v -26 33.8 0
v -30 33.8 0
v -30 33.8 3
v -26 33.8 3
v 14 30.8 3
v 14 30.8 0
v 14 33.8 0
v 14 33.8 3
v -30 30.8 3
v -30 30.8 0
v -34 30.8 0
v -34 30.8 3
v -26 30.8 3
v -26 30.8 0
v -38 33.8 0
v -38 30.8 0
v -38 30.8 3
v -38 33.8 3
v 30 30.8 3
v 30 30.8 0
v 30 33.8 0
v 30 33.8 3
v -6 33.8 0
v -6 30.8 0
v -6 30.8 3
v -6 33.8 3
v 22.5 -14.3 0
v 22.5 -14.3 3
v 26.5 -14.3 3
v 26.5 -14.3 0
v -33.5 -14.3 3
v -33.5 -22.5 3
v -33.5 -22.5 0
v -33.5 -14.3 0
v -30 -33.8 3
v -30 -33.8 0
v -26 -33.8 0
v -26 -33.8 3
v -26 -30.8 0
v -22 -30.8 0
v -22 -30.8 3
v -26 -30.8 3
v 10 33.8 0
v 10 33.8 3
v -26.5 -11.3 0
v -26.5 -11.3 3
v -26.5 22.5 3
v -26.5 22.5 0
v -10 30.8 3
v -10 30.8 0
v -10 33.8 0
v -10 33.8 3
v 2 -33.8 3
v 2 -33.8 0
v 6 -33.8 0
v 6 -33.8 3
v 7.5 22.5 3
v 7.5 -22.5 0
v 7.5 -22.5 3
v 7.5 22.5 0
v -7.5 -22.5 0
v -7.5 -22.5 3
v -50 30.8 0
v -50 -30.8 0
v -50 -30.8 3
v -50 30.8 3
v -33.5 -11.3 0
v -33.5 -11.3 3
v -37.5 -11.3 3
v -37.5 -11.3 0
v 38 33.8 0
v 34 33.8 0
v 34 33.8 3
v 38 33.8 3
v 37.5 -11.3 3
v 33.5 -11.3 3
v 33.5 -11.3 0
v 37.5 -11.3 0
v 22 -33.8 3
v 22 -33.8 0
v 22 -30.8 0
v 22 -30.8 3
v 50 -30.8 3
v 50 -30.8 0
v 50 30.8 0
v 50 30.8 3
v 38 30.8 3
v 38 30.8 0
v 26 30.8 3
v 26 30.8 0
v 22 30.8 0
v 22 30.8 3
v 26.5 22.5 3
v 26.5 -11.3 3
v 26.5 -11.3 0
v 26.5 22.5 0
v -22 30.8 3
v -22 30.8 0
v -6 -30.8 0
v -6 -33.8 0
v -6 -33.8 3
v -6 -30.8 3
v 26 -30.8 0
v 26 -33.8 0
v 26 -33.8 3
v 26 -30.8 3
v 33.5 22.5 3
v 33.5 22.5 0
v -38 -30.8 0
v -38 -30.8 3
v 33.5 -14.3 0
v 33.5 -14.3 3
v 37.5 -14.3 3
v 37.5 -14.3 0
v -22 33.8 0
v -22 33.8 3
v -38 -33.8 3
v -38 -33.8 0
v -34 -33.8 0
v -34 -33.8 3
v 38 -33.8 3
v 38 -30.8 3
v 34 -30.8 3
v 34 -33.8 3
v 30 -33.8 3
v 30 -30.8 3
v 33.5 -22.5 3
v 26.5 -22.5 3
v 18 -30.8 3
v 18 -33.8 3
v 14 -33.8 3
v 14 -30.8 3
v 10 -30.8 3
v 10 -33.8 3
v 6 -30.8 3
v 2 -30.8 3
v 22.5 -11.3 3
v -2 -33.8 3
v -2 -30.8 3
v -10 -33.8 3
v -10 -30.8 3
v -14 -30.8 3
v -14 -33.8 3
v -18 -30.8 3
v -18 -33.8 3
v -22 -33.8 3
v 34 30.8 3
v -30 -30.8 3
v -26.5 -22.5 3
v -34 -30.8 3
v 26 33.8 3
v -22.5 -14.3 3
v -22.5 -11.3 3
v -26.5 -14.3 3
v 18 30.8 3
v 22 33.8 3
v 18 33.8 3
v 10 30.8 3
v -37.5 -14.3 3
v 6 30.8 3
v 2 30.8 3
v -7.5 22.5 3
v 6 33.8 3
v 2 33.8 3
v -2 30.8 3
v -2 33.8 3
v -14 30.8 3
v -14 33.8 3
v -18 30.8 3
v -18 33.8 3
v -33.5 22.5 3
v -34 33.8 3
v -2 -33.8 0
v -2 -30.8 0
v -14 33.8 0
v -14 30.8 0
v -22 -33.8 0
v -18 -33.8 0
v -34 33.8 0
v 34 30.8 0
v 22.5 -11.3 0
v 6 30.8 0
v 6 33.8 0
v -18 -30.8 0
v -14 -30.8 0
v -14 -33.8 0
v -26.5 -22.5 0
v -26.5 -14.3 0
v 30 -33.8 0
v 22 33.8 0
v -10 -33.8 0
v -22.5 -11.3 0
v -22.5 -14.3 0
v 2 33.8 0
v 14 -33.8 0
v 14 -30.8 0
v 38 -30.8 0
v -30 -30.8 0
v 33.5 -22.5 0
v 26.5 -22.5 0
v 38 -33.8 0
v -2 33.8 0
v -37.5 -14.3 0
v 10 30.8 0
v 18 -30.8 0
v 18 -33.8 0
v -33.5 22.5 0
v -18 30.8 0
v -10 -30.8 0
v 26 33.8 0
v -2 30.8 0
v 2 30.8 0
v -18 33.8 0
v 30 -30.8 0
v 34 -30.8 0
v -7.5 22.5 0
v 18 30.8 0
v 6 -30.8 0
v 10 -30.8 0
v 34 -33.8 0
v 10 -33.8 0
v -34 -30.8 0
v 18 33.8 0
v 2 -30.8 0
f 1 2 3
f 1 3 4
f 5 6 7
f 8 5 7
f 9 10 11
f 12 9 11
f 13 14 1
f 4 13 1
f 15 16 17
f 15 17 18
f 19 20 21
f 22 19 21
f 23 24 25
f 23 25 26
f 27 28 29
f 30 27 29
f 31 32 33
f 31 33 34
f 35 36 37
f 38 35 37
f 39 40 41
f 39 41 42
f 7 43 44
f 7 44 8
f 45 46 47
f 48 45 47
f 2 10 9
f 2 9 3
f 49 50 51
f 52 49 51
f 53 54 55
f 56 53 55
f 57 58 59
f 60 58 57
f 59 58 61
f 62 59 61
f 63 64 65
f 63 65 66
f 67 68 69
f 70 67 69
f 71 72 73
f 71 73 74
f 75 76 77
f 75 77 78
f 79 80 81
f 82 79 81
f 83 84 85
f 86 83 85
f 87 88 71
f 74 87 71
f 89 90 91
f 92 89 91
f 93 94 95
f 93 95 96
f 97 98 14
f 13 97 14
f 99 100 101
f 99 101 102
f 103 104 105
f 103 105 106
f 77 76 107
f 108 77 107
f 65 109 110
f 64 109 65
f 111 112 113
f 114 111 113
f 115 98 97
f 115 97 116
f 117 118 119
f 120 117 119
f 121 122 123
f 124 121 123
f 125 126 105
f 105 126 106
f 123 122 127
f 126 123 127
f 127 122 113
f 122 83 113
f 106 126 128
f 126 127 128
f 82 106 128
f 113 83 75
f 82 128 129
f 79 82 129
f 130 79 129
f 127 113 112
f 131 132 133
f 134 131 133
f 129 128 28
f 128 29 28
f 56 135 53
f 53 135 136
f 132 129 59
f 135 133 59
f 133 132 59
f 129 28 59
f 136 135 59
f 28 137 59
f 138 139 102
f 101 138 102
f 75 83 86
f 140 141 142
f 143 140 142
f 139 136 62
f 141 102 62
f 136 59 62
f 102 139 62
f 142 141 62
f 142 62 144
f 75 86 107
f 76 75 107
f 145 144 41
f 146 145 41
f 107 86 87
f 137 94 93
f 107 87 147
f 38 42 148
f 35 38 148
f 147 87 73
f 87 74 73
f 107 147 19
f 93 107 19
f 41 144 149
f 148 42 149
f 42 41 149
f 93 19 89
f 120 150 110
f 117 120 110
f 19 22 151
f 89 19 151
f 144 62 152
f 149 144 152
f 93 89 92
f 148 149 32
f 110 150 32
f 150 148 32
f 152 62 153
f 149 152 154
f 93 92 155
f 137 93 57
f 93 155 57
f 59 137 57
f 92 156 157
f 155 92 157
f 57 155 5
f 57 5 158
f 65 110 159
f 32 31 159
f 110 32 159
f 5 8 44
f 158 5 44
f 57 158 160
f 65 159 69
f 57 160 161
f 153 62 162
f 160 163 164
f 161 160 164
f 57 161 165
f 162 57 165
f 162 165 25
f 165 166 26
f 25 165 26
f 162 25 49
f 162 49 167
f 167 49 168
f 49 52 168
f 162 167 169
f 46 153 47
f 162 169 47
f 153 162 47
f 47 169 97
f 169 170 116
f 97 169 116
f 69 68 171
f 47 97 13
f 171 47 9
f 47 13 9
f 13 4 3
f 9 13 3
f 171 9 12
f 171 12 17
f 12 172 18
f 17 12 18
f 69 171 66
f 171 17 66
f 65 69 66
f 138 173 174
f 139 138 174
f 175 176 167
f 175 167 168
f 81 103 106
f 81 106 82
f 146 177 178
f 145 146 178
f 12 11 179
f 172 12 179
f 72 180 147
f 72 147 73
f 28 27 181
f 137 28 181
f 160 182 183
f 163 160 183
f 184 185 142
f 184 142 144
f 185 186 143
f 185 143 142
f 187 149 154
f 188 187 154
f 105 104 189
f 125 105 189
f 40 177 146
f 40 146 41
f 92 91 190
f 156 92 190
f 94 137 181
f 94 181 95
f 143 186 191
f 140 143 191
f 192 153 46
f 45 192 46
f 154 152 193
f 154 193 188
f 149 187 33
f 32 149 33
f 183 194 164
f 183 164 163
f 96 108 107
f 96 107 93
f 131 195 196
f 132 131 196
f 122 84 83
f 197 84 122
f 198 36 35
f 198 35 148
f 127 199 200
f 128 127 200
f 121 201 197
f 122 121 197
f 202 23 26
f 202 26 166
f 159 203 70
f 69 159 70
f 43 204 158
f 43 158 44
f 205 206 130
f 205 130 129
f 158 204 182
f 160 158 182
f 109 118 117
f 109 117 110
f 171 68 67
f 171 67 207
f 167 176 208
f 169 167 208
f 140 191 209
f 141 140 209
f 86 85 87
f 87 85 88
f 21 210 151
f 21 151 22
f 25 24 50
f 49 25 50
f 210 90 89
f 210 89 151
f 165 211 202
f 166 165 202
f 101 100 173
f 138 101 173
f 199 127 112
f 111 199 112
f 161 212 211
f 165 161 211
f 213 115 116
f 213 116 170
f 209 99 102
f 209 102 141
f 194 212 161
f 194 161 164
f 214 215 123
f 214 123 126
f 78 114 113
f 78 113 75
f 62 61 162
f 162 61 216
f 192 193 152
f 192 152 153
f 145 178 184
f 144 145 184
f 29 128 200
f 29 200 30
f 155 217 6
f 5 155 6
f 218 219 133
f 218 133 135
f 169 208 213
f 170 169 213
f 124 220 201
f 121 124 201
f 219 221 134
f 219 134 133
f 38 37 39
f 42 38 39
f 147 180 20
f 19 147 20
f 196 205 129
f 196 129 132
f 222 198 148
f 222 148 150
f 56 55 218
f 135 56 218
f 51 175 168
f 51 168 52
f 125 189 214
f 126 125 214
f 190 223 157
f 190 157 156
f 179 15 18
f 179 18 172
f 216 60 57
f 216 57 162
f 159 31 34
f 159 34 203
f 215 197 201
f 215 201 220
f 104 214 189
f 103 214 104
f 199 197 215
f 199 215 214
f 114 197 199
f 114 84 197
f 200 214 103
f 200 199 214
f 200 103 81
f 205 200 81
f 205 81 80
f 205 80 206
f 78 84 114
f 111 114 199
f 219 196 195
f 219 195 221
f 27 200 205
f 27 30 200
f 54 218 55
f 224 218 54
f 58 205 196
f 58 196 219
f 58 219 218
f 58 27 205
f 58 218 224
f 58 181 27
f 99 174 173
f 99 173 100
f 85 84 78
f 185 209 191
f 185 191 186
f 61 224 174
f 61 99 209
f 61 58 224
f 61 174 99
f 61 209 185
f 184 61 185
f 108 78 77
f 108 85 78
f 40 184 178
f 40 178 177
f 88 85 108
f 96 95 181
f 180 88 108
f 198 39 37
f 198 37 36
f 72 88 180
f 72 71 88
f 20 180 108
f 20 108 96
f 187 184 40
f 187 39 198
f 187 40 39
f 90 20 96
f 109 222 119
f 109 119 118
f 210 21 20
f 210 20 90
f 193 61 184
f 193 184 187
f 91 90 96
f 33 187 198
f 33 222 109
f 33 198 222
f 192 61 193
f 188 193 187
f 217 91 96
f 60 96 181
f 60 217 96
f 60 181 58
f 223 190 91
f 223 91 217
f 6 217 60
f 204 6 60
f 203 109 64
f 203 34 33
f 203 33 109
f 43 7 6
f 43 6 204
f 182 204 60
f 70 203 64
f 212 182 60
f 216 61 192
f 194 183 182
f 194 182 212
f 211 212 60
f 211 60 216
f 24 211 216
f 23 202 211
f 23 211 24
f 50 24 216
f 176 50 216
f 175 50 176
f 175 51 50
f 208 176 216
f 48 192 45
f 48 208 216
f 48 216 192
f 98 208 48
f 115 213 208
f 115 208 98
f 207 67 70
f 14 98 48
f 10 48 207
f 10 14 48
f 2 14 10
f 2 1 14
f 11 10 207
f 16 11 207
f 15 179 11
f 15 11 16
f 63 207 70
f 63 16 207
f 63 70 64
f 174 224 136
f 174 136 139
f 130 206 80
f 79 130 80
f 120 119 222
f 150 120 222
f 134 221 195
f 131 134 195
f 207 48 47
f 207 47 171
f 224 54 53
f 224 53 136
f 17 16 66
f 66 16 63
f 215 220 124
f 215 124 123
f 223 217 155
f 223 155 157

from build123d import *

# Parameters (mm, degrees)
SKETCH1_W                = 100
SKETCH1_H                = 67.6
BOSS_EXTRUDE1_DEPTH      = 3
SKETCH3_W                = 4
SKETCH3_H                = 3
CUT_EXTRUDE1_DEPTH       = 10
LPATTERN1_COUNT          = 13
LPATTERN1_PITCH          = 8
SKETCH7_W                = 15
SKETCH7_H                = 45
CUT_EXTRUDE5_DEPTH       = 3
MIRROR1_COPY_1_SKETCH_W  = 4
MIRROR1_COPY_1_SKETCH_H  = 3
MIRROR1_COPY_1_DEPTH     = 10
MIRROR1_COPY_2_SKETCH_W  = 4
MIRROR1_COPY_2_SKETCH_H  = 3
MIRROR1_COPY_2_DEPTH     = 10
MIRROR1_COPY_3_SKETCH_W  = 4
MIRROR1_COPY_3_SKETCH_H  = 3
MIRROR1_COPY_3_DEPTH     = 10
MIRROR1_COPY_4_SKETCH_W  = 4
MIRROR1_COPY_4_SKETCH_H  = 3
MIRROR1_COPY_4_DEPTH     = 10
MIRROR1_COPY_5_SKETCH_W  = 4
MIRROR1_COPY_5_SKETCH_H  = 3
MIRROR1_COPY_5_DEPTH     = 10
MIRROR1_COPY_6_SKETCH_W  = 4
MIRROR1_COPY_6_SKETCH_H  = 3
MIRROR1_COPY_6_DEPTH     = 10
MIRROR1_COPY_7_SKETCH_W  = 4
MIRROR1_COPY_7_SKETCH_H  = 3
MIRROR1_COPY_7_DEPTH     = 10
MIRROR1_COPY_8_SKETCH_W  = 4
MIRROR1_COPY_8_SKETCH_H  = 3
MIRROR1_COPY_8_DEPTH     = 10
MIRROR1_COPY_9_SKETCH_W  = 4
MIRROR1_COPY_9_SKETCH_H  = 3
MIRROR1_COPY_9_DEPTH     = 10
MIRROR1_COPY_10_SKETCH_W = 4
MIRROR1_COPY_10_SKETCH_H = 3
MIRROR1_COPY_10_DEPTH    = 10
MIRROR1_COPY_11_SKETCH_W = 4
MIRROR1_COPY_11_SKETCH_H = 3
MIRROR1_COPY_11_DEPTH    = 10
MIRROR1_COPY_12_SKETCH_W = 4
MIRROR1_COPY_12_SKETCH_H = 3
MIRROR1_COPY_12_DEPTH    = 10
LPATTERN2_COUNT          = 2
LPATTERN2_PITCH          = 30
LPATTERN2_COL_COUNT      = 2
LPATTERN2_COL_PITCH      = 30
SKETCH8_W                = 4
SKETCH8_H                = 8.2
SKETCH8_H_2              = 33.8
BOSS_EXTRUDE2_DEPTH      = 3
CUT_EXTRUDE6_REACH       = 5
SKETCH9_W                = 12
SKETCH9_H                = 3


with BuildPart() as part:
    # Sketch1 → Boss-Extrude1 (new body)
    with BuildSketch(Plane.XY):
        Rectangle(SKETCH1_W, SKETCH1_H)
    extrude(amount=BOSS_EXTRUDE1_DEPTH)

    # Sketch3 → Cut-Extrude1 (cut)
    with BuildSketch(Plane(origin=(0, 0, 0), x_dir=(-1, 0, 0), z_dir=(0, 0, -1))):
        with Locations((-48, -32.3)):
            Rectangle(SKETCH3_W, SKETCH3_H)
    cut_extrude1 = extrude(amount=-CUT_EXTRUDE1_DEPTH, mode=Mode.SUBTRACT)

    # LPattern1: Cut-Extrude1 ×13
    with Locations(*[(-i * LPATTERN1_PITCH, 0, 0) for i in range(1, LPATTERN1_COUNT)]):
        add(cut_extrude1, mode=Mode.SUBTRACT)

    # Sketch7 → Cut-Extrude5 (cut)
    with BuildSketch(Plane(origin=(0, 0, 0), x_dir=(-1, 0, 0), z_dir=(0, 0, -1))):
        Rectangle(SKETCH7_W, SKETCH7_H)
    cut_extrude5 = extrude(amount=-CUT_EXTRUDE5_DEPTH, mode=Mode.SUBTRACT)

    # Mirror1: Cut-Extrude1 across plane
    add(cut_extrude1.mirror(Plane.ZX), mode=Mode.SUBTRACT)

    # Mirror1 copy 1 sketch → Mirror1 copy 1 (cut)
    with BuildSketch(Plane(origin=(-8, 0, 0), x_dir=(-1, 0, 0), z_dir=(0, 0, -1))):
        with Locations((-48, 32.3)):
            Rectangle(MIRROR1_COPY_1_SKETCH_W, MIRROR1_COPY_1_SKETCH_H)
    extrude(amount=-MIRROR1_COPY_1_DEPTH, mode=Mode.SUBTRACT)

    # Mirror1 copy 2 sketch → Mirror1 copy 2 (cut)
    with BuildSketch(Plane(origin=(-16, 0, 0), x_dir=(-1, 0, 0), z_dir=(0, 0, -1))):
        with Locations((-48, 32.3)):
            Rectangle(MIRROR1_COPY_2_SKETCH_W, MIRROR1_COPY_2_SKETCH_H)
    extrude(amount=-MIRROR1_COPY_2_DEPTH, mode=Mode.SUBTRACT)

    # Mirror1 copy 3 sketch → Mirror1 copy 3 (cut)
    with BuildSketch(Plane(origin=(-24, 0, 0), x_dir=(-1, 0, 0), z_dir=(0, 0, -1))):
        with Locations((-48, 32.3)):
            Rectangle(MIRROR1_COPY_3_SKETCH_W, MIRROR1_COPY_3_SKETCH_H)
    extrude(amount=-MIRROR1_COPY_3_DEPTH, mode=Mode.SUBTRACT)

    # Mirror1 copy 4 sketch → Mirror1 copy 4 (cut)
    with BuildSketch(Plane(origin=(-32, 0, 0), x_dir=(-1, 0, 0), z_dir=(0, 0, -1))):
        with Locations((-48, 32.3)):
            Rectangle(MIRROR1_COPY_4_SKETCH_W, MIRROR1_COPY_4_SKETCH_H)
    extrude(amount=-MIRROR1_COPY_4_DEPTH, mode=Mode.SUBTRACT)

    # Mirror1 copy 5 sketch → Mirror1 copy 5 (cut)
    with BuildSketch(Plane(origin=(-40, 0, 0), x_dir=(-1, 0, 0), z_dir=(0, 0, -1))):
        with Locations((-48, 32.3)):
            Rectangle(MIRROR1_COPY_5_SKETCH_W, MIRROR1_COPY_5_SKETCH_H)
    extrude(amount=-MIRROR1_COPY_5_DEPTH, mode=Mode.SUBTRACT)

    # Mirror1 copy 6 sketch → Mirror1 copy 6 (cut)
    with BuildSketch(Plane(origin=(-48, 0, 0), x_dir=(-1, 0, 0), z_dir=(0, 0, -1))):
        with Locations((-48, 32.3)):
            Rectangle(MIRROR1_COPY_6_SKETCH_W, MIRROR1_COPY_6_SKETCH_H)
    extrude(amount=-MIRROR1_COPY_6_DEPTH, mode=Mode.SUBTRACT)

    # Mirror1 copy 7 sketch → Mirror1 copy 7 (cut)
    with BuildSketch(Plane(origin=(-56, 0, 0), x_dir=(-1, 0, 0), z_dir=(0, 0, -1))):
        with Locations((-48, 32.3)):
            Rectangle(MIRROR1_COPY_7_SKETCH_W, MIRROR1_COPY_7_SKETCH_H)
    extrude(amount=-MIRROR1_COPY_7_DEPTH, mode=Mode.SUBTRACT)

    # Mirror1 copy 8 sketch → Mirror1 copy 8 (cut)
    with BuildSketch(Plane(origin=(-64, 0, 0), x_dir=(-1, 0, 0), z_dir=(0, 0, -1))):
        with Locations((-48, 32.3)):
            Rectangle(MIRROR1_COPY_8_SKETCH_W, MIRROR1_COPY_8_SKETCH_H)
    extrude(amount=-MIRROR1_COPY_8_DEPTH, mode=Mode.SUBTRACT)

    # Mirror1 copy 9 sketch → Mirror1 copy 9 (cut)
    with BuildSketch(Plane(origin=(-72, 0, 0), x_dir=(-1, 0, 0), z_dir=(0, 0, -1))):
        with Locations((-48, 32.3)):
            Rectangle(MIRROR1_COPY_9_SKETCH_W, MIRROR1_COPY_9_SKETCH_H)
    extrude(amount=-MIRROR1_COPY_9_DEPTH, mode=Mode.SUBTRACT)

    # Mirror1 copy 10 sketch → Mirror1 copy 10 (cut)
    with BuildSketch(Plane(origin=(-80, 0, 0), x_dir=(-1, 0, 0), z_dir=(0, 0, -1))):
        with Locations((-48, 32.3)):
            Rectangle(MIRROR1_COPY_10_SKETCH_W, MIRROR1_COPY_10_SKETCH_H)
    extrude(amount=-MIRROR1_COPY_10_DEPTH, mode=Mode.SUBTRACT)

    # Mirror1 copy 11 sketch → Mirror1 copy 11 (cut)
    with BuildSketch(Plane(origin=(-88, 0, 0), x_dir=(-1, 0, 0), z_dir=(0, 0, -1))):
        with Locations((-48, 32.3)):
            Rectangle(MIRROR1_COPY_11_SKETCH_W, MIRROR1_COPY_11_SKETCH_H)
    extrude(amount=-MIRROR1_COPY_11_DEPTH, mode=Mode.SUBTRACT)

    # Mirror1 copy 12 sketch → Mirror1 copy 12 (cut)
    with BuildSketch(Plane(origin=(-96, 0, 0), x_dir=(-1, 0, 0), z_dir=(0, 0, -1))):
        with Locations((-48, 32.3)):
            Rectangle(MIRROR1_COPY_12_SKETCH_W, MIRROR1_COPY_12_SKETCH_H)
    extrude(amount=-MIRROR1_COPY_12_DEPTH, mode=Mode.SUBTRACT)

    # LPattern2: Cut-Extrude5 ×2
    with Locations(*[(-i * LPATTERN2_PITCH, 0, 0) for i in range(1, LPATTERN2_COUNT)]):
        add(cut_extrude5, mode=Mode.SUBTRACT)

    # LPattern2 col: Cut-Extrude5 ×2
    with Locations(*[(i * LPATTERN2_COL_PITCH, 0, 0) for i in range(1, LPATTERN2_COL_COUNT)]):
        add(cut_extrude5, mode=Mode.SUBTRACT)

    # Sketch8 → Boss-Extrude2 (add)
    with BuildSketch(Plane.XY.offset(3)):
        with Locations((24.5, -18.4)):
            Rectangle(SKETCH8_W, SKETCH8_H)
        with Locations((24.5, 5.6)):
            Rectangle(SKETCH8_W, SKETCH8_H_2)
        with Locations((35.5, 5.6)):
            Rectangle(SKETCH8_W, SKETCH8_H_2)
        with Locations((35.5, -18.4)):
            Rectangle(SKETCH8_W, SKETCH8_H)
    boss_extrude2 = extrude(amount=-BOSS_EXTRUDE2_DEPTH)

    # Mirror2: Boss-Extrude2 across plane
    add(boss_extrude2.mirror(Plane(origin=(0, 0, 0), x_dir=(0, 0, 1), z_dir=(1, 0, 0))))

    # Sketch9 → Cut-Extrude6 (cut, up to next)
    with BuildSketch(Plane(origin=(0, 0, 0), x_dir=(-1, 0, 0), z_dir=(0, 0, -1)), mode=Mode.PRIVATE) as cut_extrude6_sk1:
        with Locations((-44, 32.3)):
            Rectangle(SKETCH9_W, SKETCH9_H)
    cut_extrude6_tool1 = extrude(cut_extrude6_sk1.sketch, amount=-CUT_EXTRUDE6_REACH, mode=Mode.PRIVATE) & part.part
    add(cut_extrude6_tool1.solids().sort_by_distance((44, 32.3, 0))[0], mode=Mode.SUBTRACT)
    # Sketch9 → Cut-Extrude6 (cut, up to next)
    with BuildSketch(Plane(origin=(0, 0, 0), x_dir=(-1, 0, 0), z_dir=(0, 0, -1)), mode=Mode.PRIVATE) as cut_extrude6_sk2:
        with Locations((44, 32.3)):
            Rectangle(SKETCH9_W, SKETCH9_H)
    cut_extrude6_tool2 = extrude(cut_extrude6_sk2.sketch, amount=-CUT_EXTRUDE6_REACH, mode=Mode.PRIVATE) & part.part
    add(cut_extrude6_tool2.solids().sort_by_distance((-44, 32.3, 0))[0], mode=Mode.SUBTRACT)
    # Sketch9 → Cut-Extrude6 (cut, up to next)
    with BuildSketch(Plane(origin=(0, 0, 0), x_dir=(-1, 0, 0), z_dir=(0, 0, -1)), mode=Mode.PRIVATE) as cut_extrude6_sk3:
        with Locations((44, -32.3)):
            Rectangle(SKETCH9_W, SKETCH9_H)
    cut_extrude6_tool3 = extrude(cut_extrude6_sk3.sketch, amount=-CUT_EXTRUDE6_REACH, mode=Mode.PRIVATE) & part.part
    add(cut_extrude6_tool3.solids().sort_by_distance((-44, -32.3, 0))[0], mode=Mode.SUBTRACT)
    # Sketch9 → Cut-Extrude6 (cut, up to next)
    with BuildSketch(Plane(origin=(0, 0, 0), x_dir=(-1, 0, 0), z_dir=(0, 0, -1)), mode=Mode.PRIVATE) as cut_extrude6_sk4:
        with Locations((-44, -32.3)):
            Rectangle(SKETCH9_W, SKETCH9_H)
    cut_extrude6_tool4 = extrude(cut_extrude6_sk4.sketch, amount=-CUT_EXTRUDE6_REACH, mode=Mode.PRIVATE) & part.part
    add(cut_extrude6_tool4.solids().sort_by_distance((44, -32.3, 0))[0], mode=Mode.SUBTRACT)


solid = part.part
